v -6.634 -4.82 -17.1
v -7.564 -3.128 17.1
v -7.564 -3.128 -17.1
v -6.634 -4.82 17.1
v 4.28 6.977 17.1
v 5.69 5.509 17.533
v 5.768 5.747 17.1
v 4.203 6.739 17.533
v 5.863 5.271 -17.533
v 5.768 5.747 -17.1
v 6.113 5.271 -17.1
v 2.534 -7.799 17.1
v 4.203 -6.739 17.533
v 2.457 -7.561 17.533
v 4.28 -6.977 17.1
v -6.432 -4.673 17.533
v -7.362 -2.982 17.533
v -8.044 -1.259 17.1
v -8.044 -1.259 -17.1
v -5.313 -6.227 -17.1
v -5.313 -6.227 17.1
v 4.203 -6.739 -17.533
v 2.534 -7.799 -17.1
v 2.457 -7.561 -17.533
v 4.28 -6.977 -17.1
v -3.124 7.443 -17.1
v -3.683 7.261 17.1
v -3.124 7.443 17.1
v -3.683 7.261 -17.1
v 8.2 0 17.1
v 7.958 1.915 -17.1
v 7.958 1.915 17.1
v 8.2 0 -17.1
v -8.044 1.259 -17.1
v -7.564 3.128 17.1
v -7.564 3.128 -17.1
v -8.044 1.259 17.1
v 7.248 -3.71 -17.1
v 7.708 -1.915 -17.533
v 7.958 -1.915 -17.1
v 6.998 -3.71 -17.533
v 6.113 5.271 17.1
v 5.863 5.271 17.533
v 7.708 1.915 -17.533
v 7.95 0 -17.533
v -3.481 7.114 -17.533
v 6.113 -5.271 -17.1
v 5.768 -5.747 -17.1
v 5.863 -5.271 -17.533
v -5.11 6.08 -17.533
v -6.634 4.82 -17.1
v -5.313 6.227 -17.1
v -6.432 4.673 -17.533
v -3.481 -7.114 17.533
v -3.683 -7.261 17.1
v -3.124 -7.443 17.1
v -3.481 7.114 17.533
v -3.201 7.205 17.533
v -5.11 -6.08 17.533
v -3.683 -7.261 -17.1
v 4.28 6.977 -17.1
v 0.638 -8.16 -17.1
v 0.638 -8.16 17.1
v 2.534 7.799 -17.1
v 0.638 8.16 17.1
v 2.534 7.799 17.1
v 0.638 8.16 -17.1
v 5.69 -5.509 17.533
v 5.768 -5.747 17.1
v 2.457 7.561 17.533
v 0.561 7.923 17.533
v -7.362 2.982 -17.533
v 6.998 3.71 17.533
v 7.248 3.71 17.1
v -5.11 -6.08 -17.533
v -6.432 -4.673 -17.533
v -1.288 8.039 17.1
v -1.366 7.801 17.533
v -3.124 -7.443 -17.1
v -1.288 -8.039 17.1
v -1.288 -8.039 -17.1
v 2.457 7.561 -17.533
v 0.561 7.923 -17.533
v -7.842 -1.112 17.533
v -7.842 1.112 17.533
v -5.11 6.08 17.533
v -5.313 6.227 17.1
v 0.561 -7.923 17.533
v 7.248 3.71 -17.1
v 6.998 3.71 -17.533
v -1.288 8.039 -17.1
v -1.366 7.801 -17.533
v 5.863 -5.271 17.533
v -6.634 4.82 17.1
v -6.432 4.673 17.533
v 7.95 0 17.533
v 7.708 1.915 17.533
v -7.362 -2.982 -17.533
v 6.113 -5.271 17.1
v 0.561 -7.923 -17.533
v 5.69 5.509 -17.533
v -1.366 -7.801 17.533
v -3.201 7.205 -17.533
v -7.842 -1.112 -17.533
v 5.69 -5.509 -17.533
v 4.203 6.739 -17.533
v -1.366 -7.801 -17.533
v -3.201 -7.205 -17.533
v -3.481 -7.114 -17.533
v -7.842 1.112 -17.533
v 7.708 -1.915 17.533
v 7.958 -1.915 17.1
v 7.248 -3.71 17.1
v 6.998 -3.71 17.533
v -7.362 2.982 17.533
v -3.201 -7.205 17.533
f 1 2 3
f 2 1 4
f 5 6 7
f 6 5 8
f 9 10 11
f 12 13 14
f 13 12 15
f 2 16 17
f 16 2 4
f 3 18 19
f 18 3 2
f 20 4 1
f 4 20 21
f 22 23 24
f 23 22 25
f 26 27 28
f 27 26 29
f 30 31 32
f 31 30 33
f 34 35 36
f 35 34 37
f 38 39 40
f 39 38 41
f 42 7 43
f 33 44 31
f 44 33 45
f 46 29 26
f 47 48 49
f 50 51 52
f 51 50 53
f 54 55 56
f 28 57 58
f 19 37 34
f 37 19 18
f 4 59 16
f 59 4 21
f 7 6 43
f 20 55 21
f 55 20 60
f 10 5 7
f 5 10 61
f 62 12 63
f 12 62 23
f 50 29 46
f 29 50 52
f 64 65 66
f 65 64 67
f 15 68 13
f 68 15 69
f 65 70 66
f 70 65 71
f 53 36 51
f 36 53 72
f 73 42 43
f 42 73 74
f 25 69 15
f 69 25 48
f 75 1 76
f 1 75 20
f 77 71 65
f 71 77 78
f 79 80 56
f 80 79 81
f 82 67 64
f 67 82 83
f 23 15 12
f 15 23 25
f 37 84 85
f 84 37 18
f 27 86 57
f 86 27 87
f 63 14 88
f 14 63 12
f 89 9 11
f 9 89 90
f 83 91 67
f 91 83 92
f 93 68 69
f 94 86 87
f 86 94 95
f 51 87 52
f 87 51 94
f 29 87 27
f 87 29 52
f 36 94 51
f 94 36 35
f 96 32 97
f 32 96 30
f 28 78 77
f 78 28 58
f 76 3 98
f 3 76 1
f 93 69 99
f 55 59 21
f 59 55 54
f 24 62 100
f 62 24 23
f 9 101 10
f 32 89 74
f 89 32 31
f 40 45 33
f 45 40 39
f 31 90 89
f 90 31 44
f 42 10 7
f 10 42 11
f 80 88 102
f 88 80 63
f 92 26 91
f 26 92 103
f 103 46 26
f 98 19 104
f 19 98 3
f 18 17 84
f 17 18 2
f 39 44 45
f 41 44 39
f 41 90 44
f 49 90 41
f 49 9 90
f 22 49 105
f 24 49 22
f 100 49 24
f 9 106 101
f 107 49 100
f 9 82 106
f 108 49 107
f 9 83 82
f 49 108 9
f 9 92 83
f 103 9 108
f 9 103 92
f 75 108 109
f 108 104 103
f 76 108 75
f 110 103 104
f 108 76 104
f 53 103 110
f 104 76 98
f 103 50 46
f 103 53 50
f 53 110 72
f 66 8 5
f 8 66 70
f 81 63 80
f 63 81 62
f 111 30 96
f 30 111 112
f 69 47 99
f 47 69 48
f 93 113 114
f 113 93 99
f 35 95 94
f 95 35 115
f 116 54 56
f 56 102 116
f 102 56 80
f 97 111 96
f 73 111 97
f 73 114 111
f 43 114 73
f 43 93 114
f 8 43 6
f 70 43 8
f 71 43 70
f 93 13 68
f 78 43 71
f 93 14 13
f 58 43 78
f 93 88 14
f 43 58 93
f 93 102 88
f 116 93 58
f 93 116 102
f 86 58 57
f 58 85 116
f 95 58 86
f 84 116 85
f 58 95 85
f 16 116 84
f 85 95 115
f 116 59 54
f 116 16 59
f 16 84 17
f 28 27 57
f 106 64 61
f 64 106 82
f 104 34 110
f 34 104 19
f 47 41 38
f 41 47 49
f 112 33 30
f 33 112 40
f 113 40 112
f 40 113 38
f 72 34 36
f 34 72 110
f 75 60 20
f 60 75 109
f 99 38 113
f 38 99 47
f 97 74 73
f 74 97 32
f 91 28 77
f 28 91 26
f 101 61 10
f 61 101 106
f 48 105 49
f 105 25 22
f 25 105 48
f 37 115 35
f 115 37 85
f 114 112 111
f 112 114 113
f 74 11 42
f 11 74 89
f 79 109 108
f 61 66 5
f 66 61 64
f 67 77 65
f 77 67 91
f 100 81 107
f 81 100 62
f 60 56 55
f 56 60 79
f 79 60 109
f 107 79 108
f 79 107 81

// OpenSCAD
// Parameters
height_mm = 35.2; //[17.6:70.4:0.1]
diameter_mm = 16.4; //[8.2:32.8:0.1]
positive_terminal_diameter_mm = 5.5; //[2.75:11:0.1]
positive_terminal_height_mm = 1.2; //[0.6:2.4:0.1]
negative_terminal_diameter_mm = 6; //[3:12:0.1]
negative_terminal_height_mm = 0.3; //[0.15:0.6:0.05]
body_fillet_radius_mm = 0.5; //[0.25:1:0.05]
terminal_overlap_mm = 0.8; //[0.5:2:0.1]

// Battery - complete geometry
module battery() {
  color("DimGray") {
    // Cylindrical cell body with filleted edges
    minkowski() {
      cylinder(r=diameter_mm/2 - body_fillet_radius_mm, h=height_mm - 2*body_fillet_radius_mm, center=true);
      sphere(r=body_fillet_radius_mm, center=true);
    }
    
    // Positive terminal button
    translate([0, 0, height_mm/2 - positive_terminal_height_mm/2 - terminal_overlap_mm])
      cylinder(r=positive_terminal_diameter_mm/2, h=positive_terminal_height_mm, center=true);
    
    // Negative terminal contact
    translate([0, 0, -height_mm/2 + negative_terminal_height_mm/2 + terminal_overlap_mm])
      cylinder(r=negative_terminal_diameter_mm/2, h=negative_terminal_height_mm, center=true);
  }
}

// Assembly
module assembly() {
  battery();
}

assembly();
